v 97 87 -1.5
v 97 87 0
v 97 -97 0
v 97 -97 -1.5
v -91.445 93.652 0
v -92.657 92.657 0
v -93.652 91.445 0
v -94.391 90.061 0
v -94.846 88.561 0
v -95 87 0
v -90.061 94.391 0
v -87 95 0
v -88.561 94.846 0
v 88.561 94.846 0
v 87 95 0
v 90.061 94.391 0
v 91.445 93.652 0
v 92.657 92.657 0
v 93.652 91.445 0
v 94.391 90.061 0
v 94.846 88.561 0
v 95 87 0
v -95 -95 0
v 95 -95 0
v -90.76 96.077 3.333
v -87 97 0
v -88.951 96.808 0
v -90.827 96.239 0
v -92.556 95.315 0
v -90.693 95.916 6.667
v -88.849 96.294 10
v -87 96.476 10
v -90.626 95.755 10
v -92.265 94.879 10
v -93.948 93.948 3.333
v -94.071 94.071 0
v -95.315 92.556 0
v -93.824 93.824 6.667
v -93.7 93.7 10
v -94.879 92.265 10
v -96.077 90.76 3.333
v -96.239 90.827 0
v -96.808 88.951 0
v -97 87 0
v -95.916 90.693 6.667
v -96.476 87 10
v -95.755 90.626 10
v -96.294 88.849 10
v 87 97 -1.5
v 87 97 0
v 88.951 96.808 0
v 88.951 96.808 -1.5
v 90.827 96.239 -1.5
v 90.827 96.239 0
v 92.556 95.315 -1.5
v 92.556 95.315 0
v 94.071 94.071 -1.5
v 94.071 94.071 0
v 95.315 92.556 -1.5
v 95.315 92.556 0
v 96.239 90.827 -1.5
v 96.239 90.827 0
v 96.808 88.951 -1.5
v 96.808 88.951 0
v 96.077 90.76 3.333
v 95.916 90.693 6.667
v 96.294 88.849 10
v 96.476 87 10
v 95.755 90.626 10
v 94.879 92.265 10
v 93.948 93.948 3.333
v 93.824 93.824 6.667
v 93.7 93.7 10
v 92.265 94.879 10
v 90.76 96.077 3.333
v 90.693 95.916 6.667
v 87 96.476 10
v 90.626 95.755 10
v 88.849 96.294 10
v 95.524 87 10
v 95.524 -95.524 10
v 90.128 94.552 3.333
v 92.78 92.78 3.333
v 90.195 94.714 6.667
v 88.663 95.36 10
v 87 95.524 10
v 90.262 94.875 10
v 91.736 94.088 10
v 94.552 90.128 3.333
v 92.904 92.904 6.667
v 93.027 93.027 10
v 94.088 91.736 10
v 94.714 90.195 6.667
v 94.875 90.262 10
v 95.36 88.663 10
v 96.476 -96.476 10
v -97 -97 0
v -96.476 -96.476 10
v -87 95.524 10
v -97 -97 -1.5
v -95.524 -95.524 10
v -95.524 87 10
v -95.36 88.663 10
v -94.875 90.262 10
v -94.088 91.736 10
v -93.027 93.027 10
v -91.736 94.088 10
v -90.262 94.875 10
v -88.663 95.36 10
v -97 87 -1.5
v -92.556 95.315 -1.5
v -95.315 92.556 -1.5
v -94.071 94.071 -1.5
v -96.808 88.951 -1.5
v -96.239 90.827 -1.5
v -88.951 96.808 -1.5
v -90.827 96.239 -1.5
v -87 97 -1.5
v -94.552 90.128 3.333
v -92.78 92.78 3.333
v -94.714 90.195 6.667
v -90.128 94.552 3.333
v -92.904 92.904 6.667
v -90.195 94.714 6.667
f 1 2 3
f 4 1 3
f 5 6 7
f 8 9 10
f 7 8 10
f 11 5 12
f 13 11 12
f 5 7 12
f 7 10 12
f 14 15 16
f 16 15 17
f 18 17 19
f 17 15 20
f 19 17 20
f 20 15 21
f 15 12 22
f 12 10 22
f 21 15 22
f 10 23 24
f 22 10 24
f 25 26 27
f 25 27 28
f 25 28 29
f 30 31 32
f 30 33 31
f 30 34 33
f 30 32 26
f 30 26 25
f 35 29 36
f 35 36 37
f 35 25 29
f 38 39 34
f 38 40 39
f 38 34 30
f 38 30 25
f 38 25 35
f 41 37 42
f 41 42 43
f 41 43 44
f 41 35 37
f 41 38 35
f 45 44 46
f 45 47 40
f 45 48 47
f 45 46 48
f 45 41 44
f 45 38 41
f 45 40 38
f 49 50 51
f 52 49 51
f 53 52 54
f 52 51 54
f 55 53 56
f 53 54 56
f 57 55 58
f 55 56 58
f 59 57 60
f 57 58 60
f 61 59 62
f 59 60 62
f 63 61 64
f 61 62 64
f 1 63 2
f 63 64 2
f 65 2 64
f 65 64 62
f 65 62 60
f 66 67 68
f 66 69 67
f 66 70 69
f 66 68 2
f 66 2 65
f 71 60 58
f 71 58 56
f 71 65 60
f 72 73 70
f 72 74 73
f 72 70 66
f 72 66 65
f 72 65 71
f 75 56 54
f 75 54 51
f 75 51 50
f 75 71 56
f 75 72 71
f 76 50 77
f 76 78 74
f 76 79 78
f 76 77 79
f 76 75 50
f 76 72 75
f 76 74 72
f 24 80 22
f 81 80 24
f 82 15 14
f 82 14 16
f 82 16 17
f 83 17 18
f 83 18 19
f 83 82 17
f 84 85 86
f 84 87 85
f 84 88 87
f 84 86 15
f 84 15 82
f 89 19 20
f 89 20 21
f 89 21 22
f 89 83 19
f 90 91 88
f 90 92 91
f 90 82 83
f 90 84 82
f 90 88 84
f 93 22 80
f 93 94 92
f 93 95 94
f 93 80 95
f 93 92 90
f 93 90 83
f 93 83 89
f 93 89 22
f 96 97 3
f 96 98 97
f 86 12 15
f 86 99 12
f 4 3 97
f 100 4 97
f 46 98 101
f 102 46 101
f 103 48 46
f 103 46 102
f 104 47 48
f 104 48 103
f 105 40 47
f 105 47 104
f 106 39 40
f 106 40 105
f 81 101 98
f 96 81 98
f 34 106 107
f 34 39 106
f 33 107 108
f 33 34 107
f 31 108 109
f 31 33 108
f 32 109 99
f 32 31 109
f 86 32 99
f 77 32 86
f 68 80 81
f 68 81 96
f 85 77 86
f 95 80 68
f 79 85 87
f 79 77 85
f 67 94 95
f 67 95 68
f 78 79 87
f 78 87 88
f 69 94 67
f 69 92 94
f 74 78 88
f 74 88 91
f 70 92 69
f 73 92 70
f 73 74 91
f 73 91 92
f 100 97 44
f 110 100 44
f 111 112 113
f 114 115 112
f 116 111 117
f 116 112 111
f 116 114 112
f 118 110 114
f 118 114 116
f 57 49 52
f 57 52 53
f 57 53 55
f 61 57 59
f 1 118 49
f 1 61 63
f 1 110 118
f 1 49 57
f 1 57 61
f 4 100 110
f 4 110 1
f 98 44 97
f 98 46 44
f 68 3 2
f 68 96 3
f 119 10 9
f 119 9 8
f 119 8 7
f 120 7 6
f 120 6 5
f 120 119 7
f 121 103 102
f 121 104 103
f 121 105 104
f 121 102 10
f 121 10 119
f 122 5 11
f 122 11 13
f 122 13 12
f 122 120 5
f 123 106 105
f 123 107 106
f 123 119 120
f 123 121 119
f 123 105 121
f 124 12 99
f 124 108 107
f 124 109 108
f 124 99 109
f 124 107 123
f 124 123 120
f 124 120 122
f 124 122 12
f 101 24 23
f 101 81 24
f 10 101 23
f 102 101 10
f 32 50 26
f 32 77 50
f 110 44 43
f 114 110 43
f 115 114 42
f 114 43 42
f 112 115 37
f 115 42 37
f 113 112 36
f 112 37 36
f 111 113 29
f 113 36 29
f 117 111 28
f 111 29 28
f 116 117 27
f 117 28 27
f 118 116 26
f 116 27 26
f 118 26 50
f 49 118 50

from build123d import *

# Parameters (mm, degrees)
F1_DEPTH = 10
F1_TAPER = 3
F3_DEPTH = 1.5


with BuildPart() as f1:
    # F0 (on Top) → F1 (new body)
    with BuildSketch(Plane.XY):
        with BuildLine():
            Line((-97, -97), (97, -97))
            Line((97, -97), (97, 87))
            ThreePointArc((97, 87), (94.0710678119, 94.0710678119), (87, 97))
            Line((87, 97), (-87, 97))
            ThreePointArc((-87, 97), (-94.0710678119, 94.0710678119), (-97, 87))
            Line((-97, 87), (-97, -97))
        make_face()
        with BuildLine():
            Line((95, 87), (95, -95))
            Line((95, -95), (-95, -95))
            Line((-95, -95), (-95, 87))
            ThreePointArc((-95, 87), (-92.6568542495, 92.6568542495), (-87, 95))
            Line((-87, 95), (87, 95))
            ThreePointArc((87, 95), (92.6568542495, 92.6568542495), (95, 87))
        make_face(mode=Mode.SUBTRACT)
    extrude(amount=F1_DEPTH, taper=F1_TAPER)

    # F2 (on face) → F3 (join)
    with BuildSketch(Plane(origin=(0, 0, 0), x_dir=(1, 0, 0), z_dir=(0, 0, -1))):
        with BuildLine():
            Line((97, -87), (97, 97))
            Line((97, 97), (-97, 97))
            Line((-97, 97), (-97, -87))
            ThreePointArc((-97, -87), (-94.0710678119, -94.0710678119), (-87, -97))
            Line((-87, -97), (87, -97))
            ThreePointArc((87, -97), (94.0710678119, -94.0710678119), (97, -87))
        make_face()
    extrude(amount=F3_DEPTH)


solid = f1.part
